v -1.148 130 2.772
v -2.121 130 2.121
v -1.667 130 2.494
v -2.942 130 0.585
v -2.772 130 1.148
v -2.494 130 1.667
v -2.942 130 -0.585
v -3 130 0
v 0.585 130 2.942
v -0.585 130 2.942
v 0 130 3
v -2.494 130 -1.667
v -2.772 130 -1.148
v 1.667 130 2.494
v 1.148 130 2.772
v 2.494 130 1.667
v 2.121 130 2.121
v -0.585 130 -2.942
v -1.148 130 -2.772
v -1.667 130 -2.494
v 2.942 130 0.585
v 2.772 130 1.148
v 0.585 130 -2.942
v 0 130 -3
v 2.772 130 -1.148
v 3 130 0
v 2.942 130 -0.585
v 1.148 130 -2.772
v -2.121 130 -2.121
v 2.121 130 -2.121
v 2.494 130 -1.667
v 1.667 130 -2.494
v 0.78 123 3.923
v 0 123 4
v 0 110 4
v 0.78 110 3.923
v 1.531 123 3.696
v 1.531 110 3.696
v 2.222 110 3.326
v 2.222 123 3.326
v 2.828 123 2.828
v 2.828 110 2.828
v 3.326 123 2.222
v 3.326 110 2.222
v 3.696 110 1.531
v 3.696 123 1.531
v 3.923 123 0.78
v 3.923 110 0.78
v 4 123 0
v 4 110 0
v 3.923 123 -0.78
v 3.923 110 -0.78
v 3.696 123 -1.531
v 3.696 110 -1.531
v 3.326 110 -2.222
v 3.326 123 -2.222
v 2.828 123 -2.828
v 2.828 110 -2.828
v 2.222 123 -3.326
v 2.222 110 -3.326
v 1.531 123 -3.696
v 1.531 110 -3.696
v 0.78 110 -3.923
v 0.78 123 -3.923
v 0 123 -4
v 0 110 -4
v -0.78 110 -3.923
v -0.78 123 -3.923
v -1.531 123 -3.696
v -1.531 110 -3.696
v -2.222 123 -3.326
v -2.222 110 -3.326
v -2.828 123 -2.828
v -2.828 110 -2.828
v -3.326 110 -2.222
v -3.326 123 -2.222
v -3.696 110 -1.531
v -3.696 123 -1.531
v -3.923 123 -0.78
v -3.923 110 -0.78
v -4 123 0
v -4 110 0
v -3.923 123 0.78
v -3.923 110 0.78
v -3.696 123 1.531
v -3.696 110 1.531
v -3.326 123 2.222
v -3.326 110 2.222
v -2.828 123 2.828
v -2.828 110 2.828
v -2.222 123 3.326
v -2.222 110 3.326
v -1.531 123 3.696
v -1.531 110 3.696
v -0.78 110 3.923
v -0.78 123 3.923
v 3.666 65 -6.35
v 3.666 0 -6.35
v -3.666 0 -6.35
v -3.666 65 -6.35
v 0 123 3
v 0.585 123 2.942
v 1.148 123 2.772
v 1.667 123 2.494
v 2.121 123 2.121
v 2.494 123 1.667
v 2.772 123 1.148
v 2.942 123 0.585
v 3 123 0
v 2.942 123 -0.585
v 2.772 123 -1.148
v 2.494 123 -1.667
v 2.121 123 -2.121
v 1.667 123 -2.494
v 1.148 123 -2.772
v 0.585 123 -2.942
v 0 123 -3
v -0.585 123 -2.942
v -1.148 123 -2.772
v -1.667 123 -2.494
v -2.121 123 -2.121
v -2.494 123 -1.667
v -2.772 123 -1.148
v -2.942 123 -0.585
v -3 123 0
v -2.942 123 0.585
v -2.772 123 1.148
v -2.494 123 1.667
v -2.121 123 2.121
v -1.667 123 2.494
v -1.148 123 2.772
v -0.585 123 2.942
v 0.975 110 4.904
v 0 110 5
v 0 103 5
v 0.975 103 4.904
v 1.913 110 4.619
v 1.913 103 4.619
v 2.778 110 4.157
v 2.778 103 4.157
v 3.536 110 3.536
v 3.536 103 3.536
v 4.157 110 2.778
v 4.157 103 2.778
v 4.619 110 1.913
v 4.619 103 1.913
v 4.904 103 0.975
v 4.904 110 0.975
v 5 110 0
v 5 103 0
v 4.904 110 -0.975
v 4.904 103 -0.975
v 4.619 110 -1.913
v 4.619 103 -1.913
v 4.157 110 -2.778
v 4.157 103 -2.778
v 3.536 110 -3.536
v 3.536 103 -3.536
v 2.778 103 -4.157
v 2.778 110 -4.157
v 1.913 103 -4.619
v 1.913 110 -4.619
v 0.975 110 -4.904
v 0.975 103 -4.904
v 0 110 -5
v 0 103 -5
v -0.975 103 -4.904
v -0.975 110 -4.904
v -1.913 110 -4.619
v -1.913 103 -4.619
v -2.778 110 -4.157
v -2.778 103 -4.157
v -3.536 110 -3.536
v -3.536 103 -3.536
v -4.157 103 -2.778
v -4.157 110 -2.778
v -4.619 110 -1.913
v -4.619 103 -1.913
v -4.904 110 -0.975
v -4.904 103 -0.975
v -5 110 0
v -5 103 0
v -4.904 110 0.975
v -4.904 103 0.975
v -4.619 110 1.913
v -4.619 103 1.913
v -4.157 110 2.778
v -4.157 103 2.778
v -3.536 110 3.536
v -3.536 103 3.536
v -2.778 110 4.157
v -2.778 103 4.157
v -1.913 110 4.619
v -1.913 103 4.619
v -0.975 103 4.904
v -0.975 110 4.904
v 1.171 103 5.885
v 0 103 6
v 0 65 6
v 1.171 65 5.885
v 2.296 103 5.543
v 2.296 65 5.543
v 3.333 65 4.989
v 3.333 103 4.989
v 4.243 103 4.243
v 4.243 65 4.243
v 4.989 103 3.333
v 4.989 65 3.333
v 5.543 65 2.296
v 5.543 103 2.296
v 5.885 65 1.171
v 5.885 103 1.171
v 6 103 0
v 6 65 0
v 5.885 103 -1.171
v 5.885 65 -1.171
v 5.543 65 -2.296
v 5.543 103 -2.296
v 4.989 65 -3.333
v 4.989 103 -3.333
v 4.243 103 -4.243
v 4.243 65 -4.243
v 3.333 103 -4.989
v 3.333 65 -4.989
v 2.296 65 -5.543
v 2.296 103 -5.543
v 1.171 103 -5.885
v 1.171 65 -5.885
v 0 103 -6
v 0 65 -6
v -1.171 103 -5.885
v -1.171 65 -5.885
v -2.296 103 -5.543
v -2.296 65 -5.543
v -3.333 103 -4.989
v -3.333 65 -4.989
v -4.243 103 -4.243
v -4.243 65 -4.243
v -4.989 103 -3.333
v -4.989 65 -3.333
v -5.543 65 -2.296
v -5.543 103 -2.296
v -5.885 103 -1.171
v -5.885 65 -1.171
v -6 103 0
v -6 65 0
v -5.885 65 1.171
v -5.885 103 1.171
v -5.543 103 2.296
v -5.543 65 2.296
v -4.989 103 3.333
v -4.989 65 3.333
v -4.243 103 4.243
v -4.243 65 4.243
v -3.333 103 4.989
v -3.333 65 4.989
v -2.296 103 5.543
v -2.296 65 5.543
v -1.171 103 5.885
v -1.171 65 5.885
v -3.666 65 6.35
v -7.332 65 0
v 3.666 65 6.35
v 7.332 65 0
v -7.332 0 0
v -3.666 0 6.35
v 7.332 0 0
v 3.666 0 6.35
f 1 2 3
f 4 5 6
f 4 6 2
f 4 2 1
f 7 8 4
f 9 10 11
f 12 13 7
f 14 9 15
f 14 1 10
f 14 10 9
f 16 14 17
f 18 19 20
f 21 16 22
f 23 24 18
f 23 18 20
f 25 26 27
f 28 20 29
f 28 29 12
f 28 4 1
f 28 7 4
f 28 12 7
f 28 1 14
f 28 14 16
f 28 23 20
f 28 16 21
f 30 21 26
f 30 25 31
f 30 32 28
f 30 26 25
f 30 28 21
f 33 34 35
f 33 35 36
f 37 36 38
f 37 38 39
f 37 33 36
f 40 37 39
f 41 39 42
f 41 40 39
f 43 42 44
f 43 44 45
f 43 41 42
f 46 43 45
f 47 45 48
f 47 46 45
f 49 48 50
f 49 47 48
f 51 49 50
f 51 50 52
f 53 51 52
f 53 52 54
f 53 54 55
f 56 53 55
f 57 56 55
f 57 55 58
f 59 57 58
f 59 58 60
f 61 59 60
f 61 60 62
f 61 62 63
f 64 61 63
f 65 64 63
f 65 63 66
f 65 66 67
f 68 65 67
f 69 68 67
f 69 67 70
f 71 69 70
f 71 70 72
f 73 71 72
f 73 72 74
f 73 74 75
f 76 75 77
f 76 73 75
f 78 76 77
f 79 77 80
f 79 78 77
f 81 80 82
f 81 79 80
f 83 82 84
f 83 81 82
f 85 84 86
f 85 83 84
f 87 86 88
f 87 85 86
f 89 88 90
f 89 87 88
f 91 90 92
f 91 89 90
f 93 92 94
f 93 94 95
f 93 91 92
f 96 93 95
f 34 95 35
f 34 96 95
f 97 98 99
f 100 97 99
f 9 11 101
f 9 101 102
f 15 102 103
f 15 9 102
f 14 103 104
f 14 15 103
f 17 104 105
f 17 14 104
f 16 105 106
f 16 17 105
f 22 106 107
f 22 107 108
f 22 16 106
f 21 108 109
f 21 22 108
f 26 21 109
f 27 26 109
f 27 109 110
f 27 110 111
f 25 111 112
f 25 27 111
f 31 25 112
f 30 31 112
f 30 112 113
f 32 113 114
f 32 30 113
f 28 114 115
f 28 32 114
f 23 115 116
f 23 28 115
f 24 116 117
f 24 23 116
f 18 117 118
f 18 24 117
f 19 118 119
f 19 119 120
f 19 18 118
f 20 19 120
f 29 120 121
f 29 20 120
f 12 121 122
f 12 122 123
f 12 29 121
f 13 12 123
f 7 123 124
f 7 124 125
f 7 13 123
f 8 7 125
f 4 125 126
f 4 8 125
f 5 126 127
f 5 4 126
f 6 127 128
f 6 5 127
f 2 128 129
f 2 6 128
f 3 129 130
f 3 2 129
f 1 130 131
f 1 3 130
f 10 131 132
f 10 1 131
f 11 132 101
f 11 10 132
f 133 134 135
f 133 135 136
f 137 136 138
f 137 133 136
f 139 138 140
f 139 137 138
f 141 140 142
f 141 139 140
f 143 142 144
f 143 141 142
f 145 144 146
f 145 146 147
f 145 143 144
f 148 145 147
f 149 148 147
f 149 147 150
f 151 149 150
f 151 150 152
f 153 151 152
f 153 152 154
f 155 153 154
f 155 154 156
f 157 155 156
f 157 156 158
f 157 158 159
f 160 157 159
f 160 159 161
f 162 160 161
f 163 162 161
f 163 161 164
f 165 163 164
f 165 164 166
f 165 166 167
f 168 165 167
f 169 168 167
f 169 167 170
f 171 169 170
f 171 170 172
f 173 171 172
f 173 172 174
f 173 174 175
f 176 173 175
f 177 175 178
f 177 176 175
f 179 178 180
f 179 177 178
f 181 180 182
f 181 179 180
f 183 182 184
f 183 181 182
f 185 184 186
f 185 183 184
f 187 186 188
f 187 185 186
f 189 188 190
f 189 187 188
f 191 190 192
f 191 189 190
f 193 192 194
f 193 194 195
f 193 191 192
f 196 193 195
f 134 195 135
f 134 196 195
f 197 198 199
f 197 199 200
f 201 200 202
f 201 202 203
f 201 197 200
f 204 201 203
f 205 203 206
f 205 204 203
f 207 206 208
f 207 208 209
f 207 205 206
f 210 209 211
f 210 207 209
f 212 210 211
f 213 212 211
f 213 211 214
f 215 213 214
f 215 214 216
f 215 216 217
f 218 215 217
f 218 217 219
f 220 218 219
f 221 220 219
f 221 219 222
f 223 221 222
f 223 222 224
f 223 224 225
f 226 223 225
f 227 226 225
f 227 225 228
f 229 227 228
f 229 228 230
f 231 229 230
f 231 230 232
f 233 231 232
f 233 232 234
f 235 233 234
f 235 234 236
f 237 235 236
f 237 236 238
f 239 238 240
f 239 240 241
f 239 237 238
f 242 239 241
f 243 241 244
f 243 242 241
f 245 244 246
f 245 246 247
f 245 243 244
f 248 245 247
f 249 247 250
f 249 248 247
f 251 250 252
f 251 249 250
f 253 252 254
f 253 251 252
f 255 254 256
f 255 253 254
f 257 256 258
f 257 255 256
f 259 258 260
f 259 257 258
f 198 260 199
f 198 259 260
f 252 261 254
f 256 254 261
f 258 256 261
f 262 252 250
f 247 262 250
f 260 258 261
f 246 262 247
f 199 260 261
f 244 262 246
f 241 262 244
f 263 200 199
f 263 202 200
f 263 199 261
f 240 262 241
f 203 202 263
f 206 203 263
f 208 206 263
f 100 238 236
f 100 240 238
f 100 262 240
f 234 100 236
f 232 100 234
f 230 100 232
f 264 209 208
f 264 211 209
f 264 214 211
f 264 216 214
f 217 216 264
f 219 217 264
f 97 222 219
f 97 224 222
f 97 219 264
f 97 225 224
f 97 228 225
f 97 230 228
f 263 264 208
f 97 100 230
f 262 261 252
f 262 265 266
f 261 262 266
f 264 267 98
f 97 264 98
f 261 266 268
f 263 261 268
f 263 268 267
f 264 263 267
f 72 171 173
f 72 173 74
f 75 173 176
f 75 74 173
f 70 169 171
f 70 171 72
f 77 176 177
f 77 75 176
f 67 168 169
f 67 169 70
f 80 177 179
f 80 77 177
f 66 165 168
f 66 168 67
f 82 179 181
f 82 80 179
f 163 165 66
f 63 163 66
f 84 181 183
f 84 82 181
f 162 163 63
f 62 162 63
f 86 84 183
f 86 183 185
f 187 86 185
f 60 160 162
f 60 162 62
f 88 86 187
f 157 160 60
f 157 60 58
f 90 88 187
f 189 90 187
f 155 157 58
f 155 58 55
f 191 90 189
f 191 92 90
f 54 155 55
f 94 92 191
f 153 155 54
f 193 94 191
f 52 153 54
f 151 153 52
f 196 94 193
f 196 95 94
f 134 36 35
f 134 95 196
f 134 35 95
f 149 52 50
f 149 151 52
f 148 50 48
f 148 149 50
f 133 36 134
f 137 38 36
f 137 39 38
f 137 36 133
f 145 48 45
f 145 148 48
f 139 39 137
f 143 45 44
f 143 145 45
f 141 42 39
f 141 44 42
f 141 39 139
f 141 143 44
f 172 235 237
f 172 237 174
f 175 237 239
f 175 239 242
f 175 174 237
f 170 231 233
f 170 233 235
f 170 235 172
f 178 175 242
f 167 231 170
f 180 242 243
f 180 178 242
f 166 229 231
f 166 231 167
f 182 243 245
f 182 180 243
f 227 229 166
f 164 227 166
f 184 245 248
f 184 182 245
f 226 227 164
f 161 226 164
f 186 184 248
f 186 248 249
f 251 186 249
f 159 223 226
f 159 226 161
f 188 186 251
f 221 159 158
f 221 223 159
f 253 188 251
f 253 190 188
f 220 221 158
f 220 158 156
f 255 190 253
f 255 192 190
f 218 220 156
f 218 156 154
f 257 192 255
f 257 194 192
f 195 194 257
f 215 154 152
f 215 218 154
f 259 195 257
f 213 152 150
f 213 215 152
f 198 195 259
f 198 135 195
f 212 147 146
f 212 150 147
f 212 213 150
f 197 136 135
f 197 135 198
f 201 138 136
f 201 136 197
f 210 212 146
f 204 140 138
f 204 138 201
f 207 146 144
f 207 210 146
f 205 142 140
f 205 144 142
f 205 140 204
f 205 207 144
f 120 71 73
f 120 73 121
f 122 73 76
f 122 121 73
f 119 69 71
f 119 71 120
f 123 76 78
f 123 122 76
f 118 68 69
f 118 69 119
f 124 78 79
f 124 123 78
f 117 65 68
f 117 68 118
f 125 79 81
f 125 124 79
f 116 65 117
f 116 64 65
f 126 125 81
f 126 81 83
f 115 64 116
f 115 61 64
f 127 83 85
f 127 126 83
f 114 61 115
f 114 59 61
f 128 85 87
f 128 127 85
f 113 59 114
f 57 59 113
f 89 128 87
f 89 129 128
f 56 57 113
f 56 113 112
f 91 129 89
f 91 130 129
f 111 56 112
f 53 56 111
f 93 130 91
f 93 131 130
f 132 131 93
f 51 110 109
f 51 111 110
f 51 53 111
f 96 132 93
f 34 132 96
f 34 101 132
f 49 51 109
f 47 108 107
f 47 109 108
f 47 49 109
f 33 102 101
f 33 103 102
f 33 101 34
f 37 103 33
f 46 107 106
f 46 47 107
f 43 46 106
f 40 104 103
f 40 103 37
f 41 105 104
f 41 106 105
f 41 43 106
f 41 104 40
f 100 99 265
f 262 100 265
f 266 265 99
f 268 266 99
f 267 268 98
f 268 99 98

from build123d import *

# Parameters (mm, degrees)
SALIENTE_EXTRUIR1_DEPTH = 130
CROQUIS3_R              = 7.332348419
CROQUIS3_R_2            = 6
CORTAR_EXTRUIR1_DEPTH   = 65
CROQUIS4_R              = 6
CROQUIS4_R_2            = 5
CORTAR_EXTRUIR2_DEPTH   = 27
CROQUIS5_R              = 5
CROQUIS5_R_2            = 4
CORTAR_EXTRUIR3_DEPTH   = 20
CROQUIS6_R              = 4
CROQUIS6_R_2            = 3
CORTAR_EXTRUIR4_DEPTH   = 7


with BuildPart() as part:
    # Croquis2 → Saliente-Extruir1 (new body)
    with BuildSketch(Plane(origin=(0, 0, 0), x_dir=(1, 0, 0), z_dir=(0, 1, 0))):
        Polygon((7.332348419, 0), (3.666174209, 6.35), (-3.666174209, 6.35), (-7.332348419, 0), (-3.666174209, -6.35), (3.666174209, -6.35), align=None)
    extrude(amount=SALIENTE_EXTRUIR1_DEPTH)

    # Croquis3 → Cortar-Extruir1 (cut)
    with BuildSketch(Plane(origin=(0, 130, 0), x_dir=(1, 0, 0), z_dir=(0, 1, 0))):
        Circle(CROQUIS3_R)
        with Locations(Location((0, 0, 0), (0, 0, 270))):
            Circle(CROQUIS3_R_2, mode=Mode.SUBTRACT)
    extrude(amount=-CORTAR_EXTRUIR1_DEPTH, mode=Mode.SUBTRACT)

    # Croquis4 → Cortar-Extruir2 (cut)
    with BuildSketch(Plane(origin=(0, 130, 0), x_dir=(1, 0, 0), z_dir=(0, 1, 0))):
        with Locations(Location((0, 0, 0), (0, 0, 270))):
            Circle(CROQUIS4_R)
        with Locations(Location((0, 0, 0), (0, 0, 270))):
            Circle(CROQUIS4_R_2, mode=Mode.SUBTRACT)
    extrude(amount=-CORTAR_EXTRUIR2_DEPTH, mode=Mode.SUBTRACT)

    # Croquis5 → Cortar-Extruir3 (cut)
    with BuildSketch(Plane(origin=(0, 130, 0), x_dir=(1, 0, 0), z_dir=(0, 1, 0))):
        with Locations(Location((0, 0, 0), (0, 0, 270))):
            Circle(CROQUIS5_R)
        with Locations(Location((0, 0, 0), (0, 0, 270))):
            Circle(CROQUIS5_R_2, mode=Mode.SUBTRACT)
    extrude(amount=-CORTAR_EXTRUIR3_DEPTH, mode=Mode.SUBTRACT)

    # Croquis6 → Cortar-Extruir4 (cut)
    with BuildSketch(Plane(origin=(0, 130, 0), x_dir=(1, 0, 0), z_dir=(0, 1, 0))):
        with Locations(Location((0, 0, 0), (0, 0, 270))):
            Circle(CROQUIS6_R)
        with Locations(Location((0, 0, 0), (0, 0, 270))):
            Circle(CROQUIS6_R_2, mode=Mode.SUBTRACT)
    extrude(amount=-CORTAR_EXTRUIR4_DEPTH, mode=Mode.SUBTRACT)


solid = part.part
